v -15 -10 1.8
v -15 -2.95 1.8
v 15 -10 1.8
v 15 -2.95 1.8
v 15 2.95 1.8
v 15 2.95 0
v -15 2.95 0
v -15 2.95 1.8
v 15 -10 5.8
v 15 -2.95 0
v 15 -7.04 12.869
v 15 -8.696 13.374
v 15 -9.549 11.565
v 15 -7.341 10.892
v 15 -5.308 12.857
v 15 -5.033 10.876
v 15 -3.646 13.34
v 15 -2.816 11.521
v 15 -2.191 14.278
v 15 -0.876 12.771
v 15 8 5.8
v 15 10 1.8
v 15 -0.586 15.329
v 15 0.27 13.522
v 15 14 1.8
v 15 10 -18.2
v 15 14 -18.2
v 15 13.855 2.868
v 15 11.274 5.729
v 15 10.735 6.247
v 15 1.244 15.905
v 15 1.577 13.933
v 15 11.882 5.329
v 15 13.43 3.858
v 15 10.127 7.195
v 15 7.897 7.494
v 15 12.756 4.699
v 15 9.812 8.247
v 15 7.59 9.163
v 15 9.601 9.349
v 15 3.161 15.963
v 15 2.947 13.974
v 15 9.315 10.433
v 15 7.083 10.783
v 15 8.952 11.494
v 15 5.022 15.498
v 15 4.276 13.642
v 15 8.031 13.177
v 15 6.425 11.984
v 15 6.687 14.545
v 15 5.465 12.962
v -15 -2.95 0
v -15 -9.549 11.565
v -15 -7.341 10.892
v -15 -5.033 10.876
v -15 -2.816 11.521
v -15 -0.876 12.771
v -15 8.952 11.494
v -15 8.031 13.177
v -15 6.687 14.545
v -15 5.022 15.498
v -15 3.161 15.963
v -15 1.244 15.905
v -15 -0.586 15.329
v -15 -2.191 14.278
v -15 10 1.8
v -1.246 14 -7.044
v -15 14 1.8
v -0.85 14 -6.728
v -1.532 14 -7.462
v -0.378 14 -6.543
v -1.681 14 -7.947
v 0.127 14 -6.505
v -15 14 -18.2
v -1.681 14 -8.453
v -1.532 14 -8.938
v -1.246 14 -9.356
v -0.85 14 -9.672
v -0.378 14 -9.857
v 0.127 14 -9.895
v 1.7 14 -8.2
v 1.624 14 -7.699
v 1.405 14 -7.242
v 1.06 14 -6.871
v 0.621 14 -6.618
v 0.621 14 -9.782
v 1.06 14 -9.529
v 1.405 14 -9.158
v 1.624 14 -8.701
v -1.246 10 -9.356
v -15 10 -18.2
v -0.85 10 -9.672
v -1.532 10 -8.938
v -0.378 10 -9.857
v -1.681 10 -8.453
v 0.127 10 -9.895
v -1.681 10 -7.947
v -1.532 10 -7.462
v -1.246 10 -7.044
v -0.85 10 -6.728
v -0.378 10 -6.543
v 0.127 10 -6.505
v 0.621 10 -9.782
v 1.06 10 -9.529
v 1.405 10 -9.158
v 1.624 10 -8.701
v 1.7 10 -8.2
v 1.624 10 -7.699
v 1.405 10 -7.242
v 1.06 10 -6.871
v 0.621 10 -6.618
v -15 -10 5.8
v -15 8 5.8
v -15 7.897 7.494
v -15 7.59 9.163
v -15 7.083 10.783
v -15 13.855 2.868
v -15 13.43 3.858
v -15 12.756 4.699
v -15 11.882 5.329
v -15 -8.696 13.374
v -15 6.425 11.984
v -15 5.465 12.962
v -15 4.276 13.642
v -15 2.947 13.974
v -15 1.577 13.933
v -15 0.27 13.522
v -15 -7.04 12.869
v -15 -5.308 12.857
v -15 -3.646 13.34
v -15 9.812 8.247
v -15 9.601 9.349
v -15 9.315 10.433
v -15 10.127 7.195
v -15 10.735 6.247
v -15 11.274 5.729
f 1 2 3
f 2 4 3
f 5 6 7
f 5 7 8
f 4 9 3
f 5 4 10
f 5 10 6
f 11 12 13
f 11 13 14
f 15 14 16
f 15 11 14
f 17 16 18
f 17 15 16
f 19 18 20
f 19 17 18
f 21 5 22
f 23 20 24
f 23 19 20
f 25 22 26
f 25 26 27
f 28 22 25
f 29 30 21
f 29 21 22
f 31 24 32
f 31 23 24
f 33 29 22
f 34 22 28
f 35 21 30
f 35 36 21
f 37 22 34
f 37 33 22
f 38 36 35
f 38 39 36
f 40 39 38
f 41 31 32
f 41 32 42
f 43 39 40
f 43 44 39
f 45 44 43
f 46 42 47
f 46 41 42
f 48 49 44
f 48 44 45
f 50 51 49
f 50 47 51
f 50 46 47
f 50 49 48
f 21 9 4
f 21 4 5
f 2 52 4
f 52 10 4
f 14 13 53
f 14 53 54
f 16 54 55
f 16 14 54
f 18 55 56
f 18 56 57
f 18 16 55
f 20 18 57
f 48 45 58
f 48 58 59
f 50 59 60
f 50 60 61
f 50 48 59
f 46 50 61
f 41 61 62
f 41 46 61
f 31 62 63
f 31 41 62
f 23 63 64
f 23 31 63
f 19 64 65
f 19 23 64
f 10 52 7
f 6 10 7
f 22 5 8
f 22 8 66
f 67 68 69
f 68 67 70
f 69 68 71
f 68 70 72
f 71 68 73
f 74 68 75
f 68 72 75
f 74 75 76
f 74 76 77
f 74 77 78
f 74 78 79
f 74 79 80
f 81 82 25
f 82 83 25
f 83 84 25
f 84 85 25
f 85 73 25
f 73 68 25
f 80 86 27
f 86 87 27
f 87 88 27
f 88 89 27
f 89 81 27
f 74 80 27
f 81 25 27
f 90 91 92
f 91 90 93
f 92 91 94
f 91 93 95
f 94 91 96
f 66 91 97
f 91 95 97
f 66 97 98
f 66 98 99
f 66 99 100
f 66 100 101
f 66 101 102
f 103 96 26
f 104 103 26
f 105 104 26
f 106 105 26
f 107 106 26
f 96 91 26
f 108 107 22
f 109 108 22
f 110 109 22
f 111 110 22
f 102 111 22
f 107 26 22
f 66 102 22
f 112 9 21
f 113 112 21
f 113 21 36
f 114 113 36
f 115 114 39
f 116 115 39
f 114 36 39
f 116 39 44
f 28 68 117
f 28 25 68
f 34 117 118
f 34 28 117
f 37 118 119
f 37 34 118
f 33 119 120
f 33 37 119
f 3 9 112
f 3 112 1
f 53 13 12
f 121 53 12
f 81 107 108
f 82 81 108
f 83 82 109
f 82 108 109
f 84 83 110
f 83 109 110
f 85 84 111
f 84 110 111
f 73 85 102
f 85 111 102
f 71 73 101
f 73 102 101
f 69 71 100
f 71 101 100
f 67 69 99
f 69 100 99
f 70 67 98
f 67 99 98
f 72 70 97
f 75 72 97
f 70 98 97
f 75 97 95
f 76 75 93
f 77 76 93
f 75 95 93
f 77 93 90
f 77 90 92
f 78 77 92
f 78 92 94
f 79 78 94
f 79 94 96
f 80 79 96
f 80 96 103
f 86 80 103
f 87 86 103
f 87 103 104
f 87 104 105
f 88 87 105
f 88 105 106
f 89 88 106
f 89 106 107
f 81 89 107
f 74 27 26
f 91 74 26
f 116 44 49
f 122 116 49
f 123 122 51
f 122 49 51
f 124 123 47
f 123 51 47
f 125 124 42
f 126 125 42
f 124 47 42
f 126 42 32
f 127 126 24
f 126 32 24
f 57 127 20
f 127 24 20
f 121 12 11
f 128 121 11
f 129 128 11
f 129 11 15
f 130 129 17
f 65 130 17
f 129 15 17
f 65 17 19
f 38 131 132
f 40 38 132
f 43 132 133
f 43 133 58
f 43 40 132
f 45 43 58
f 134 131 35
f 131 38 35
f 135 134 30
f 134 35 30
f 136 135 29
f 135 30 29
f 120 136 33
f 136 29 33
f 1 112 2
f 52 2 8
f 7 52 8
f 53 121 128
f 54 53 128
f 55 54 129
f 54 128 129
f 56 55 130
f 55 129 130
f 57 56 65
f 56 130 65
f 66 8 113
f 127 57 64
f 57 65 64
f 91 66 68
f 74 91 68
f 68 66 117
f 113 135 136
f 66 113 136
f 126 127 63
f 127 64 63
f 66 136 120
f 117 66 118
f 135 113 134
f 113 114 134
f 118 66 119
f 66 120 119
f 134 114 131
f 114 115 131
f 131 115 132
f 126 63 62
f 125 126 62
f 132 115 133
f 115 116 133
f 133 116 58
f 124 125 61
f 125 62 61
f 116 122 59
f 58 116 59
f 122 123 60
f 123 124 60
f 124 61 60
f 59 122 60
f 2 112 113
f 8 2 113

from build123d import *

# Parameters (mm, degrees)
PAD018_DEPTH    = 15
FILLET017_R     = 4
SKETCH077_R     = 1.7
POCKET041_DEPTH = 14.0010001


with BuildPart() as part:
    # Sketch076 → Pad018 (new body, symmetric)
    with BuildSketch(Plane.YZ):
        with BuildLine():
            Line((-2.95, 0), (2.95, 0))
            Line((2.95, 0), (2.95, 1.8))
            Line((2.95, 1.8), (10, 1.8))
            Line((10, -18.2), (10, 1.8))
            Line((14, -18.2), (10, -18.2))
            Line((14, 1.8), (14, -18.2))
            ThreePointArc((14, 1.8), (12.8284271247, 4.6284271247), (10, 5.8))
            ThreePointArc((10, 5.8), (9.7359108307, 8.6950147374), (8.9523612088, 11.4944617201))
            ThreePointArc((8.9523612088, 11.4944617201), (4.1074030924, 15.7943944981), (-2.1905894743, 14.2783698696))
            ThreePointArc((-8.6955362552, 13.3740094918), (-5.3083417089, 12.8571578981), (-2.1905894743, 14.2783698696))
            Line((-9.5491968047, 11.565345989), (-8.6955362552, 13.3740094918))
            ThreePointArc((-9.5491968047, 11.565345989), (-5.0329374097, 10.8762105308), (-0.8759344302, 12.7711598262))
            ThreePointArc((7.0833160577, 10.7826540051), (3.6226316889, 13.8540345608), (-0.8759344302, 12.7711598262))
            ThreePointArc((8, 5.8), (7.7689219768, 8.3331378952), (7.0833160577, 10.7826540051))
            Line((-10, 5.8), (8, 5.8))
            Line((-10, 5.8), (-10, 1.8))
            Line((-2.95, 1.8), (-10, 1.8))
            Line((-2.95, 0), (-2.95, 1.8))
        make_face()
    extrude(amount=PAD018_DEPTH, both=True)

    # Fillet017
    fillet017_edges = [part.edges().sort_by_distance(p)[0] for p in [
        (0, 10, 5.8),
    ]]
    fillet(fillet017_edges, radius=FILLET017_R)

    # Sketch077 → Pocket041 (cut, through all)
    with BuildSketch(Plane.XZ):
        with Locations((0, -8.2)):
            Circle(SKETCH077_R)
    extrude(amount=-POCKET041_DEPTH, mode=Mode.SUBTRACT)


solid = part.part
